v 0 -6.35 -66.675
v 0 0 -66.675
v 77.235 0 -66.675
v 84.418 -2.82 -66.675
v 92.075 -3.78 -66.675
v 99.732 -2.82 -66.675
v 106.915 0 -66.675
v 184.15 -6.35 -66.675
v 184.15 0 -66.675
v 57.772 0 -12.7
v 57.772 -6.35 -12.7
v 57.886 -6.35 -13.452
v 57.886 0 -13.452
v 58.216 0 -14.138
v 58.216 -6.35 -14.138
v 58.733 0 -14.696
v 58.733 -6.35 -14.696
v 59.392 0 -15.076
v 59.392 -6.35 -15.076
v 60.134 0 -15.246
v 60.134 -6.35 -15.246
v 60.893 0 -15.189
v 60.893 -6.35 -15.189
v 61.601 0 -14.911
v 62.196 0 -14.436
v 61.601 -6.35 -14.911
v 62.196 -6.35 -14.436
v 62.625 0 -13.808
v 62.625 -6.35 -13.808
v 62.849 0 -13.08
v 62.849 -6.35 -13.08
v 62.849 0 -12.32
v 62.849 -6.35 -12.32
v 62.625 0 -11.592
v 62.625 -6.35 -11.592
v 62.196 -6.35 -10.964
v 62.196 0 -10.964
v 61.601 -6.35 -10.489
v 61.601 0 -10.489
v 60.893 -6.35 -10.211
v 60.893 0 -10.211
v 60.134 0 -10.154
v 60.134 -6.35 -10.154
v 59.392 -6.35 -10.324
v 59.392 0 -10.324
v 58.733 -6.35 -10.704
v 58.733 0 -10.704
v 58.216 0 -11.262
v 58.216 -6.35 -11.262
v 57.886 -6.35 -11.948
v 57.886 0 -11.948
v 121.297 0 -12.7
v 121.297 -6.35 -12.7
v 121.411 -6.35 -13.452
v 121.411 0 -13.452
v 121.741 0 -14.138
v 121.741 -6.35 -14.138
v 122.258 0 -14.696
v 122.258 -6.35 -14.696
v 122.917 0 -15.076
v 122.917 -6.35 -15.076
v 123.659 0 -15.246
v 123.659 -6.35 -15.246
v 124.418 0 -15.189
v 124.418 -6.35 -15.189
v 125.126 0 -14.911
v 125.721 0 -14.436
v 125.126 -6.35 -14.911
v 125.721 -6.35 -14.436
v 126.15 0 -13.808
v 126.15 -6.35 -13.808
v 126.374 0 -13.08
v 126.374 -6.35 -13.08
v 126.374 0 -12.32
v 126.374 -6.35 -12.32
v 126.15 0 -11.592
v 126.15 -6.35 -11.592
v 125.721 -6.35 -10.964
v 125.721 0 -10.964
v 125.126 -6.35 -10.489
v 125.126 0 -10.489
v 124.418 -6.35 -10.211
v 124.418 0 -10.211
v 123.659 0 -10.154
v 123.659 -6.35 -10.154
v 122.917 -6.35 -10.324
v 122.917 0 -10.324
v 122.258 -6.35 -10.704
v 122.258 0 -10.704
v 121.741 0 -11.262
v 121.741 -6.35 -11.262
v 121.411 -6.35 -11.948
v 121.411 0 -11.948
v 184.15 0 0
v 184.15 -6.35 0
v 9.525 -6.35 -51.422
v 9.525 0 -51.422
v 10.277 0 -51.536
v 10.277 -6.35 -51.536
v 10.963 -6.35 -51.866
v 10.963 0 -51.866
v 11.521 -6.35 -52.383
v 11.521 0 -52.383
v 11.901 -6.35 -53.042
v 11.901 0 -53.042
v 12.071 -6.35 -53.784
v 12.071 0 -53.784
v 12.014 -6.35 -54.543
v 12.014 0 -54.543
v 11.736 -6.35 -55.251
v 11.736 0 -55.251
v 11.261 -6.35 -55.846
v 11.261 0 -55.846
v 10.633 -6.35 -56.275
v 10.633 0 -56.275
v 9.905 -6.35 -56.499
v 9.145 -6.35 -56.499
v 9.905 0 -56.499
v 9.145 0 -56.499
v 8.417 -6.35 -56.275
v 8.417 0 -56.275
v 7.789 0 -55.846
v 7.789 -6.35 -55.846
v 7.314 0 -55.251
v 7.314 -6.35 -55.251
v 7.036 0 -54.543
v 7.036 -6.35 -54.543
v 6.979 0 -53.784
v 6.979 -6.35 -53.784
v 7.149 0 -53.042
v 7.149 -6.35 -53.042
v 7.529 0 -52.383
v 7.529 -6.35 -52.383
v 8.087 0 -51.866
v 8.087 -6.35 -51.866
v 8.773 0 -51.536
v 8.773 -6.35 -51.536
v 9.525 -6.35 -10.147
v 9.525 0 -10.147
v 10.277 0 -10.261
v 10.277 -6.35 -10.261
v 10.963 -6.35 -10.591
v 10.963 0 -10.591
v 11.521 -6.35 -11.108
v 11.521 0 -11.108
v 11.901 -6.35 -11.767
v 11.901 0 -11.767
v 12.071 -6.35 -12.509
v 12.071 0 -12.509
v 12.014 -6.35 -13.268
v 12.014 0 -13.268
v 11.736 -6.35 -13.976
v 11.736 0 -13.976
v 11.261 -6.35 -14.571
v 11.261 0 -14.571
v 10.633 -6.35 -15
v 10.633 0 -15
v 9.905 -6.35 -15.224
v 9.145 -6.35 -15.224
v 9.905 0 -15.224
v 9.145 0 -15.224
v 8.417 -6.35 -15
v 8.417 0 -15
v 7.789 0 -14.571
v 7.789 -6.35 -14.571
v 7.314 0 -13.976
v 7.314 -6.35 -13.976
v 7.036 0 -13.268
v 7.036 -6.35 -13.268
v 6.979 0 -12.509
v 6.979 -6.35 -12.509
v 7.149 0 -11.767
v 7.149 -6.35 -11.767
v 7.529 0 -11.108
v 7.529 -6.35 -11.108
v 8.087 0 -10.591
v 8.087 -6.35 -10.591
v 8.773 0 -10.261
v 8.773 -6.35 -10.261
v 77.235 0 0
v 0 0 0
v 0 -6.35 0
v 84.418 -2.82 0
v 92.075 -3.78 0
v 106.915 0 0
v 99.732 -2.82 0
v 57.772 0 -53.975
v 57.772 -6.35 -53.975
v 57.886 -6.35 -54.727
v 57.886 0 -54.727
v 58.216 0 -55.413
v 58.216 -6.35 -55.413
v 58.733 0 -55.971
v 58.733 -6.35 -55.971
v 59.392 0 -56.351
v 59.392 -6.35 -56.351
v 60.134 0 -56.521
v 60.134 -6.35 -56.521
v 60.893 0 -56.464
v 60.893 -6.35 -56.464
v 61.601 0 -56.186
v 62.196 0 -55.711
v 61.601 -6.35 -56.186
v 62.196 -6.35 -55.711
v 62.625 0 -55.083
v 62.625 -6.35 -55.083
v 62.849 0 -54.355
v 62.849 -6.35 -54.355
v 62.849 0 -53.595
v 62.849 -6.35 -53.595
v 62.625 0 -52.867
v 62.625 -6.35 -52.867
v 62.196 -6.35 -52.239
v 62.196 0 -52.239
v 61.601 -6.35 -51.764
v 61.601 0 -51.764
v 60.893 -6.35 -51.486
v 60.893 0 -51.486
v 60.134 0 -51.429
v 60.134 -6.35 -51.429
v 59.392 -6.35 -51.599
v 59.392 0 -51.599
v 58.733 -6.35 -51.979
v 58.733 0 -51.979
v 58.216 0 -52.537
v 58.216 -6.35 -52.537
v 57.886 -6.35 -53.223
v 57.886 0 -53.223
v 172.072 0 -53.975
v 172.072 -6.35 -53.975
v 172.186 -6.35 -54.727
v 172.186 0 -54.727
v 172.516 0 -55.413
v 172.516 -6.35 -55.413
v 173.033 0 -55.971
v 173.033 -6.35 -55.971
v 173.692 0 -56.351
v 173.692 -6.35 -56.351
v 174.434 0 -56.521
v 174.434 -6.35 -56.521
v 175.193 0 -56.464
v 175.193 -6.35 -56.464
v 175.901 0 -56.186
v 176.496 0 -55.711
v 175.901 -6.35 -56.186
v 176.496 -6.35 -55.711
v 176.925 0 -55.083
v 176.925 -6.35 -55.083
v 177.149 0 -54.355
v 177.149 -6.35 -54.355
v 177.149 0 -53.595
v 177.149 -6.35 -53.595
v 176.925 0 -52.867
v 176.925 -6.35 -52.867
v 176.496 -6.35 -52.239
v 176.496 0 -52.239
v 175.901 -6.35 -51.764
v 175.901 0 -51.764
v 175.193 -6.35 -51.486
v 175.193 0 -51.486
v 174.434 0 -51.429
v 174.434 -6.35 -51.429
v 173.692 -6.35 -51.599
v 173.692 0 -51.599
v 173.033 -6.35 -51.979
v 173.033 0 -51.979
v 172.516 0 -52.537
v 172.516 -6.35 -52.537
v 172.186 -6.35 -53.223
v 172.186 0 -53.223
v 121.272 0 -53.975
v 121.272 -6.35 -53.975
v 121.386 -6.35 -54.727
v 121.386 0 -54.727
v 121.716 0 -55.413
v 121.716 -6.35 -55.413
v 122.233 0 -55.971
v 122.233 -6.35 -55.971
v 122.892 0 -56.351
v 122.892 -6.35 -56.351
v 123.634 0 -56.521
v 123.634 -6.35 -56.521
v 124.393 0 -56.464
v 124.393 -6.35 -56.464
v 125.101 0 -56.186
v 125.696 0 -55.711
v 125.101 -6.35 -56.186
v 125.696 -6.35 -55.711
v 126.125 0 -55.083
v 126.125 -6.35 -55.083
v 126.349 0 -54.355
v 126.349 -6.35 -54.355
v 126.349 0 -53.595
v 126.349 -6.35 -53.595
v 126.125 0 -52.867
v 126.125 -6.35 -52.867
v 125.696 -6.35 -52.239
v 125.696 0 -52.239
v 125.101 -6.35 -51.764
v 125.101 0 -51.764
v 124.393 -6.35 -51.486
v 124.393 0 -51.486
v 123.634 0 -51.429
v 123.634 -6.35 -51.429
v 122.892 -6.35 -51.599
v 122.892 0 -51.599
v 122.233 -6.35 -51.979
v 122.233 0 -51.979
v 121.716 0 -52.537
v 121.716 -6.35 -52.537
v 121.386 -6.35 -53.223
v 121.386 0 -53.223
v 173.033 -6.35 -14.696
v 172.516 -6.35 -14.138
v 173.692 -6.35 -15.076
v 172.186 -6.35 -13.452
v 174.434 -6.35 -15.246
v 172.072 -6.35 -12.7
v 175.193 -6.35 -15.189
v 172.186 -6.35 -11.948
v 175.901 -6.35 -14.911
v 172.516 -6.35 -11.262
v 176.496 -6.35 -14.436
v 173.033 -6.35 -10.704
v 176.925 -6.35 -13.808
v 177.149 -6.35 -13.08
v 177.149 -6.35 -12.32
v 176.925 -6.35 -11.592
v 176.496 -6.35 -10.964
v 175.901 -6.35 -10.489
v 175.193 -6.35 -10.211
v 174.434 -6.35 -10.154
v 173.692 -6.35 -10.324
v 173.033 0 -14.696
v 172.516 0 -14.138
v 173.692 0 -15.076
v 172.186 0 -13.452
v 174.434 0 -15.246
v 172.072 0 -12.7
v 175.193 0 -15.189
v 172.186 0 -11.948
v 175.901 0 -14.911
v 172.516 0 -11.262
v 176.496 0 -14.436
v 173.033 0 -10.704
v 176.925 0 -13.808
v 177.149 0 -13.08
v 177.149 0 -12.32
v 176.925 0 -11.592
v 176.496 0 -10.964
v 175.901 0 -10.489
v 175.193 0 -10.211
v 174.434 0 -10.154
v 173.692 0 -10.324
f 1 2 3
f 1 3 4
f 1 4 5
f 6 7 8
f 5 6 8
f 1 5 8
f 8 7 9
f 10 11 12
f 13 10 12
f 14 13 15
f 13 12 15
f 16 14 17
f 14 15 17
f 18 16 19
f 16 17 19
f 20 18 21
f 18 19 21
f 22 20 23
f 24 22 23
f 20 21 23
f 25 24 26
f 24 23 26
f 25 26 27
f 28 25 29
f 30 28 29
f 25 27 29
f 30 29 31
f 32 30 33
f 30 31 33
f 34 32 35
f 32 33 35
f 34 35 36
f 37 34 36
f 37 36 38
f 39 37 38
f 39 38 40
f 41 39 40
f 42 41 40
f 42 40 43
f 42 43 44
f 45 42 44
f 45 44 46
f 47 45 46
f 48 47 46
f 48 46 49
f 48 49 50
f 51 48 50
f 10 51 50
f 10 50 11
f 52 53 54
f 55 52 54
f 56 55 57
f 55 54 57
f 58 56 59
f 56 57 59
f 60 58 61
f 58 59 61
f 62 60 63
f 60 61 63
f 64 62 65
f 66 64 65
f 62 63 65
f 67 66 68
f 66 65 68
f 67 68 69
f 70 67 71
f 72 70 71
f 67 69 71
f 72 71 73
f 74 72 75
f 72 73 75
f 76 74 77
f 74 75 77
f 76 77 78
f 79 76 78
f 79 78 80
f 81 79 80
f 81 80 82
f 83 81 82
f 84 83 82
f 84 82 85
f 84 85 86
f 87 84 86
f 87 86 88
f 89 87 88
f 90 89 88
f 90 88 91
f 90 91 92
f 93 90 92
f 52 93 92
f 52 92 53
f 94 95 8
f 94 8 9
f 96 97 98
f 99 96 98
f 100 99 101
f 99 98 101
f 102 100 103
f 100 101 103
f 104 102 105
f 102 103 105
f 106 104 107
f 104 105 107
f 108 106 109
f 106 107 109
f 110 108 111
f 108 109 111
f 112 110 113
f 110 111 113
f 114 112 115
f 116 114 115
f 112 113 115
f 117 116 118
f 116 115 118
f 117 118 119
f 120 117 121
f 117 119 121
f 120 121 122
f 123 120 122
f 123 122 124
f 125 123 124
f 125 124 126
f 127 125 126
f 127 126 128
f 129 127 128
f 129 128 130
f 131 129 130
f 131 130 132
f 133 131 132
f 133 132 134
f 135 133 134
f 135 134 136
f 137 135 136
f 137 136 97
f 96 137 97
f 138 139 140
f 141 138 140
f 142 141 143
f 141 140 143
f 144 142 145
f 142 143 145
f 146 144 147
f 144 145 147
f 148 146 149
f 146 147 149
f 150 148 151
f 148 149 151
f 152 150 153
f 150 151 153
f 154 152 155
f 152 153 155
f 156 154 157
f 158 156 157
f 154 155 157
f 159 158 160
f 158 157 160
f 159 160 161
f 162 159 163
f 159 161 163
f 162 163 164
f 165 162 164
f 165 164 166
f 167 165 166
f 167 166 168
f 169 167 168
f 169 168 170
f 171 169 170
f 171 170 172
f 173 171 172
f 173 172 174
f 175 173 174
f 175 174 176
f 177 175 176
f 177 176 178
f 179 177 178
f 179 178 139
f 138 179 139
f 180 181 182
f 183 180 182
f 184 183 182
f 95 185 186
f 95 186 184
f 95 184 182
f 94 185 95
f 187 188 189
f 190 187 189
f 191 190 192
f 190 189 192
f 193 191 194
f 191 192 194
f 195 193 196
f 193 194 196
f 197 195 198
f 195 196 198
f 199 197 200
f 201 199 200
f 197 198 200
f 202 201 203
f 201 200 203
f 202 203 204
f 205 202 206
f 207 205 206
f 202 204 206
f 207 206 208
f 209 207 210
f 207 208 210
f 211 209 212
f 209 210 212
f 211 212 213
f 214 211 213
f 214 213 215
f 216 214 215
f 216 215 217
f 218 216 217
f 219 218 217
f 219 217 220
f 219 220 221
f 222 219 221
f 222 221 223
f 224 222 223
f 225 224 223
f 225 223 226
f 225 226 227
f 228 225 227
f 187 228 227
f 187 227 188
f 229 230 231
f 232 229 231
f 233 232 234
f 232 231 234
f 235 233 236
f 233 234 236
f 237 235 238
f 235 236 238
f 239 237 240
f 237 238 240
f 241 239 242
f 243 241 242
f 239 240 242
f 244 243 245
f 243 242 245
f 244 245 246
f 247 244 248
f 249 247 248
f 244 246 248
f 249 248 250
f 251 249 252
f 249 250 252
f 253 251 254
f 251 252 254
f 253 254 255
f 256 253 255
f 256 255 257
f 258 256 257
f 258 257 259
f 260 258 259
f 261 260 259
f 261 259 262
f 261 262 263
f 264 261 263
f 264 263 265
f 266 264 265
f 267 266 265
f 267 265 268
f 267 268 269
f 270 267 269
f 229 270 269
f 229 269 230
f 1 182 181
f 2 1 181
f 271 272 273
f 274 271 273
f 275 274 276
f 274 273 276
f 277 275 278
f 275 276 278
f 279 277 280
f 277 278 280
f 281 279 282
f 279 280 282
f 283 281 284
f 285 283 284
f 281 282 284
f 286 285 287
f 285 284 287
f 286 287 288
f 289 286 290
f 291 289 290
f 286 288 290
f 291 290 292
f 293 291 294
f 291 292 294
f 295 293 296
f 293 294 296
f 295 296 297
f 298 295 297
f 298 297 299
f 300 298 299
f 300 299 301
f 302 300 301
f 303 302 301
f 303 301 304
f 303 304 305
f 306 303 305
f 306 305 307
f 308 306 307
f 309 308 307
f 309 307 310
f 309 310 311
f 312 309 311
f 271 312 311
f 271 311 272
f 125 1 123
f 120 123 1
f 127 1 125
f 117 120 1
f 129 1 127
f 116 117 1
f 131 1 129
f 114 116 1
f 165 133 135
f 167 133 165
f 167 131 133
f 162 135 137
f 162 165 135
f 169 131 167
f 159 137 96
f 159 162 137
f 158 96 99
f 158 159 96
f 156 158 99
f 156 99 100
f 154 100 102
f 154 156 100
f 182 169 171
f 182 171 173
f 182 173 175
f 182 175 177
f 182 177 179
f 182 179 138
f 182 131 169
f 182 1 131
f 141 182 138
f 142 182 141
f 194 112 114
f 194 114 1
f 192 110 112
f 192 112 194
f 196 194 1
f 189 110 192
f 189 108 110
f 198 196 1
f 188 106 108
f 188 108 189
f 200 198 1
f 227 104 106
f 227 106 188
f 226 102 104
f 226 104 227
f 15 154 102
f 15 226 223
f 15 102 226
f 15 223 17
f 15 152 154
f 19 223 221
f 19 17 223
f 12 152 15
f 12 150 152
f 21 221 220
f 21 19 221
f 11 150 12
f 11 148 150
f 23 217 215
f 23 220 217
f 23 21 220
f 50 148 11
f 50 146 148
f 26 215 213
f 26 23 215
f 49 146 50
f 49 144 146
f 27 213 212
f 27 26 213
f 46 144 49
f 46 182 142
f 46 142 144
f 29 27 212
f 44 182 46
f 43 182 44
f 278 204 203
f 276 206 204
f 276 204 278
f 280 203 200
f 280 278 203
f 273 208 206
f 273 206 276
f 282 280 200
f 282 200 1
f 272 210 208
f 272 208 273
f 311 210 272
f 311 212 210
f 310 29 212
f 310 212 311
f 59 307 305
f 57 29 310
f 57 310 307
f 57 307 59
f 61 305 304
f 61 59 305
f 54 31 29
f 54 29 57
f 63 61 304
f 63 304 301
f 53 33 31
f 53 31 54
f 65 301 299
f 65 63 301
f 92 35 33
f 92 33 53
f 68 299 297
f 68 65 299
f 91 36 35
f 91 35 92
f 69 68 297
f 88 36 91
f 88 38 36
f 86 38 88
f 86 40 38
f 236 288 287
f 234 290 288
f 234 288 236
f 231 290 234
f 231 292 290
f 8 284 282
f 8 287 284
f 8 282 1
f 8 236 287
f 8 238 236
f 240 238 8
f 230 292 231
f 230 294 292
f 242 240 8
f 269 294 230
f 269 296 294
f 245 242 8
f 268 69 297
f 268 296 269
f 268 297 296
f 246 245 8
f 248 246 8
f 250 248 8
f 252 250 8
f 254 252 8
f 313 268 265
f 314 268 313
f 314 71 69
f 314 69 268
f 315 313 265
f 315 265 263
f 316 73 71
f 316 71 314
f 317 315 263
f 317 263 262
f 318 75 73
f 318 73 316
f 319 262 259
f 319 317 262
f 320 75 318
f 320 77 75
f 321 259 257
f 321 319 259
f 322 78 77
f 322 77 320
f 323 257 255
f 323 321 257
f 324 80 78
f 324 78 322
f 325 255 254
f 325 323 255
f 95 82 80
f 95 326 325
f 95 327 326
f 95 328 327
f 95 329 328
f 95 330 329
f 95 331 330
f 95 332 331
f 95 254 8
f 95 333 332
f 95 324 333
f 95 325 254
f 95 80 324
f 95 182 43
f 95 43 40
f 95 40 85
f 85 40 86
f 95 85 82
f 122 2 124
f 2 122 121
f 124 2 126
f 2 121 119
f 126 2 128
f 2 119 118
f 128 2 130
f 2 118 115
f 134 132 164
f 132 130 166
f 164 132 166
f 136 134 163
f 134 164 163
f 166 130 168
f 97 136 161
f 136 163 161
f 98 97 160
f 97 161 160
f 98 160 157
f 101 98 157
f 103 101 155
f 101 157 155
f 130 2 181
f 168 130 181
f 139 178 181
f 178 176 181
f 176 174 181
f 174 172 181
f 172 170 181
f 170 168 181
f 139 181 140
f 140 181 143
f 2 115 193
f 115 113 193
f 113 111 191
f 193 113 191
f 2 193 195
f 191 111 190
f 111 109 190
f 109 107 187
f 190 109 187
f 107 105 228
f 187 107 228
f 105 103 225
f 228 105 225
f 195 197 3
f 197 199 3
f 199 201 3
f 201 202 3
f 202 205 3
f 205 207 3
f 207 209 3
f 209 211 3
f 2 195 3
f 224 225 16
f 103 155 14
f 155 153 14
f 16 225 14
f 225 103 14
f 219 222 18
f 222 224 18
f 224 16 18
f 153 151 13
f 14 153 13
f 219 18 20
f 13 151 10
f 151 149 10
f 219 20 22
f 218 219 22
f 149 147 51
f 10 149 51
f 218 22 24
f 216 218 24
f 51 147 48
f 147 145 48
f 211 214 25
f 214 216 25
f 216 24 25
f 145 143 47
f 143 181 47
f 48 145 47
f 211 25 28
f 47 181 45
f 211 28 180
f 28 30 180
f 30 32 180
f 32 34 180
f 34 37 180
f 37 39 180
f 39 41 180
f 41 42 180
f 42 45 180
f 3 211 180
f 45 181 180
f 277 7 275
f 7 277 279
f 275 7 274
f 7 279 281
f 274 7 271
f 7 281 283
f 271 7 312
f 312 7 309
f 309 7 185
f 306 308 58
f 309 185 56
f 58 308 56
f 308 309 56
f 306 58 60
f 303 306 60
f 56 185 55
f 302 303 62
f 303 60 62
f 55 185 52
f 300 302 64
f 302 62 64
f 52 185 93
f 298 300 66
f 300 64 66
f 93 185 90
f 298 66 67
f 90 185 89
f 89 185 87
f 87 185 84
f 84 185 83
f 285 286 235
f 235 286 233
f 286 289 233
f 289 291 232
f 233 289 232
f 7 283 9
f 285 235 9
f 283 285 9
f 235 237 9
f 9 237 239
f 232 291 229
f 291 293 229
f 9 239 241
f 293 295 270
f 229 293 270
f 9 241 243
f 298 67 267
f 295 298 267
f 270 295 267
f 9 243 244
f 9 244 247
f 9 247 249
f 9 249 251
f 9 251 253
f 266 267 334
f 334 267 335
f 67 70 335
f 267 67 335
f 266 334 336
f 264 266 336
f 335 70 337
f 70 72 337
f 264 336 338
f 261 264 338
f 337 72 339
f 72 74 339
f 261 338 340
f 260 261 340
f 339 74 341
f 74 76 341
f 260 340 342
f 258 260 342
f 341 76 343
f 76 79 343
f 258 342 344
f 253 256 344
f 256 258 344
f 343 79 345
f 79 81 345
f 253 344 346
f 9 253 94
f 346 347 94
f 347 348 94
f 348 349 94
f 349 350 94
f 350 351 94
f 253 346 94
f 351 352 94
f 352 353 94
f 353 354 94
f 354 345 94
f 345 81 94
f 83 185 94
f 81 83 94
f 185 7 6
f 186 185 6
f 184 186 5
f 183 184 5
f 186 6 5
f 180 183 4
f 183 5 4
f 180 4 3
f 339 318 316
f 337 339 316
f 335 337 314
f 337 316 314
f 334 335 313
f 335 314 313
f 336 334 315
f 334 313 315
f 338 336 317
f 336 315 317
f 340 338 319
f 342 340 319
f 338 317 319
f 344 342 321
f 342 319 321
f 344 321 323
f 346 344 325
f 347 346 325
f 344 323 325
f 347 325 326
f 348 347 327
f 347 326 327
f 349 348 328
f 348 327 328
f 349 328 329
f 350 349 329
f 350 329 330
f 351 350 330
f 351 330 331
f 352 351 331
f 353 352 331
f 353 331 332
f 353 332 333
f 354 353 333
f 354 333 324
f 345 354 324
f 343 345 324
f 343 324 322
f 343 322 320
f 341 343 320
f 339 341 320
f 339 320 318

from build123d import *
from build123d.topology import SkipClean

# Parameters (mm, degrees)
SKETCH1_W              = 184.15
SKETCH1_H              = 66.675
BOSS_EXTRUDE1_DEPTH    = 10.541
SKETCH4_W              = 76.2
SKETCH4_H              = 6.35
BOSS_EXTRUDE2_DEPTH    = 66.675
SKETCH5_W              = 53.975
SKETCH5_H              = 66.675
CUT_EXTRUDE1_DEPTH     = 9.525
SKETCH17_W             = 53.975
SKETCH17_H             = 6.35
BOSS_EXTRUDE3_DEPTH    = 66.675
F_10_CLEARANCE_HOLE1_D = 5.1054
SKETCH12_R             = 31.019294643
CUT_EXTRUDE3_DEPTH     = 197.132329834
SKETCH18_W             = 53.975
SKETCH18_H             = 6.35
BOSS_EXTRUDE4_DEPTH    = 66.675
SKETCH20_W             = 53.975
SKETCH20_H             = 1.016
CUT_EXTRUDE8_DEPTH     = 197.132329834
SKETCH21_R             = 2.5527
CUT_EXTRUDE9_DEPTH     = 197.132329834
SKETCH22_W             = 184.15
SKETCH22_H             = 10.541
CUT_EXTRUDE10_DEPTH    = 197.132329834


with BuildPart() as part:
    # Sketch1 → Boss-Extrude1 (new body)
    with BuildSketch(Plane(origin=(0, 0, 0), x_dir=(1, 0, 0), z_dir=(0, 1, 0))):
        with Locations((92.075, 33.3375)):
            Rectangle(SKETCH1_W, SKETCH1_H)
    extrude(amount=BOSS_EXTRUDE1_DEPTH)

    # Sketch4 → Boss-Extrude2 (add)
    with BuildSketch(Plane.XY):
        with Locations((92.075, -3.175)):
            Rectangle(SKETCH4_W, SKETCH4_H)
    extrude(amount=-BOSS_EXTRUDE2_DEPTH)

    # Sketch5 → Cut-Extrude1 (cut)
    with BuildSketch(Plane(origin=(0, 10.541, 0), x_dir=(1, 0, 0), z_dir=(0, 1, 0))):
        with Locations((92.075, 33.3375)):
            Rectangle(SKETCH5_W, SKETCH5_H)
    extrude(amount=-CUT_EXTRUDE1_DEPTH, mode=Mode.SUBTRACT)

    # Sketch17 → Boss-Extrude3 (add)
    with BuildSketch(Plane.XY):
        with Locations((157.1625, -3.175)):
            Rectangle(SKETCH17_W, SKETCH17_H)
    extrude(amount=-BOSS_EXTRUDE3_DEPTH)

    # #10 Clearance Hole1 (through all)
    with Locations(Plane(origin=(0, 10.541, 0), x_dir=(1, 0, 0), z_dir=(0, 1, 0))):
        with Locations((9.525, 53.975), (9.525, 12.7), (60.325, 12.7), (60.325, 53.975), (123.825, 53.975), (123.849810746, 12.7), (174.625, 12.7), (174.625, 53.975)):
            Hole(F_10_CLEARANCE_HOLE1_D / 2)

    # Sketch12 → Cut-Extrude3 (cut, through all)
    with BuildSketch(Plane(origin=(0, 0, -66.675), x_dir=(-1, 0, 0), z_dir=(0, 0, -1))):
        with Locations((-92.075, 27.239371317)):
            Circle(SKETCH12_R)
    extrude(amount=-CUT_EXTRUDE3_DEPTH, mode=Mode.SUBTRACT)

    # Sketch18 → Boss-Extrude4 (add)
    with BuildSketch(Plane.XY):
        with Locations((26.9875, -3.175)):
            Rectangle(SKETCH18_W, SKETCH18_H)
    extrude(amount=-BOSS_EXTRUDE4_DEPTH)

    # Sketch20 → Cut-Extrude8 (cut, through all)
    with BuildSketch(Plane.XY):
        with Locations((92.075, 0.508)):
            Rectangle(SKETCH20_W, SKETCH20_H)
    extrude(amount=-CUT_EXTRUDE8_DEPTH, mode=Mode.SUBTRACT)

    # Sketch21 → Cut-Extrude9 (cut, through all)
    with SkipClean():  # the faces are left unmerged after this step: merging them gives an invalid solid
        with BuildSketch(Plane(origin=(0, 0, 0), x_dir=(1, 0, 0), z_dir=(0, 1, 0))):
            with Locations(Location((9.525, 12.7, 0), (0, 0, 270))):
                Circle(SKETCH21_R)
            with Locations(Location((9.525, 53.975, 0), (0, 0, 270))):
                Circle(SKETCH21_R)
        extrude(amount=-CUT_EXTRUDE9_DEPTH, mode=Mode.SUBTRACT)

    # Sketch22 → Cut-Extrude10 (cut, through all)
    with BuildSketch(Plane.XY):
        with Locations((92.075, 5.2705)):
            Rectangle(SKETCH22_W, SKETCH22_H)
    extrude(amount=-CUT_EXTRUDE10_DEPTH, mode=Mode.SUBTRACT)


solid = part.part
